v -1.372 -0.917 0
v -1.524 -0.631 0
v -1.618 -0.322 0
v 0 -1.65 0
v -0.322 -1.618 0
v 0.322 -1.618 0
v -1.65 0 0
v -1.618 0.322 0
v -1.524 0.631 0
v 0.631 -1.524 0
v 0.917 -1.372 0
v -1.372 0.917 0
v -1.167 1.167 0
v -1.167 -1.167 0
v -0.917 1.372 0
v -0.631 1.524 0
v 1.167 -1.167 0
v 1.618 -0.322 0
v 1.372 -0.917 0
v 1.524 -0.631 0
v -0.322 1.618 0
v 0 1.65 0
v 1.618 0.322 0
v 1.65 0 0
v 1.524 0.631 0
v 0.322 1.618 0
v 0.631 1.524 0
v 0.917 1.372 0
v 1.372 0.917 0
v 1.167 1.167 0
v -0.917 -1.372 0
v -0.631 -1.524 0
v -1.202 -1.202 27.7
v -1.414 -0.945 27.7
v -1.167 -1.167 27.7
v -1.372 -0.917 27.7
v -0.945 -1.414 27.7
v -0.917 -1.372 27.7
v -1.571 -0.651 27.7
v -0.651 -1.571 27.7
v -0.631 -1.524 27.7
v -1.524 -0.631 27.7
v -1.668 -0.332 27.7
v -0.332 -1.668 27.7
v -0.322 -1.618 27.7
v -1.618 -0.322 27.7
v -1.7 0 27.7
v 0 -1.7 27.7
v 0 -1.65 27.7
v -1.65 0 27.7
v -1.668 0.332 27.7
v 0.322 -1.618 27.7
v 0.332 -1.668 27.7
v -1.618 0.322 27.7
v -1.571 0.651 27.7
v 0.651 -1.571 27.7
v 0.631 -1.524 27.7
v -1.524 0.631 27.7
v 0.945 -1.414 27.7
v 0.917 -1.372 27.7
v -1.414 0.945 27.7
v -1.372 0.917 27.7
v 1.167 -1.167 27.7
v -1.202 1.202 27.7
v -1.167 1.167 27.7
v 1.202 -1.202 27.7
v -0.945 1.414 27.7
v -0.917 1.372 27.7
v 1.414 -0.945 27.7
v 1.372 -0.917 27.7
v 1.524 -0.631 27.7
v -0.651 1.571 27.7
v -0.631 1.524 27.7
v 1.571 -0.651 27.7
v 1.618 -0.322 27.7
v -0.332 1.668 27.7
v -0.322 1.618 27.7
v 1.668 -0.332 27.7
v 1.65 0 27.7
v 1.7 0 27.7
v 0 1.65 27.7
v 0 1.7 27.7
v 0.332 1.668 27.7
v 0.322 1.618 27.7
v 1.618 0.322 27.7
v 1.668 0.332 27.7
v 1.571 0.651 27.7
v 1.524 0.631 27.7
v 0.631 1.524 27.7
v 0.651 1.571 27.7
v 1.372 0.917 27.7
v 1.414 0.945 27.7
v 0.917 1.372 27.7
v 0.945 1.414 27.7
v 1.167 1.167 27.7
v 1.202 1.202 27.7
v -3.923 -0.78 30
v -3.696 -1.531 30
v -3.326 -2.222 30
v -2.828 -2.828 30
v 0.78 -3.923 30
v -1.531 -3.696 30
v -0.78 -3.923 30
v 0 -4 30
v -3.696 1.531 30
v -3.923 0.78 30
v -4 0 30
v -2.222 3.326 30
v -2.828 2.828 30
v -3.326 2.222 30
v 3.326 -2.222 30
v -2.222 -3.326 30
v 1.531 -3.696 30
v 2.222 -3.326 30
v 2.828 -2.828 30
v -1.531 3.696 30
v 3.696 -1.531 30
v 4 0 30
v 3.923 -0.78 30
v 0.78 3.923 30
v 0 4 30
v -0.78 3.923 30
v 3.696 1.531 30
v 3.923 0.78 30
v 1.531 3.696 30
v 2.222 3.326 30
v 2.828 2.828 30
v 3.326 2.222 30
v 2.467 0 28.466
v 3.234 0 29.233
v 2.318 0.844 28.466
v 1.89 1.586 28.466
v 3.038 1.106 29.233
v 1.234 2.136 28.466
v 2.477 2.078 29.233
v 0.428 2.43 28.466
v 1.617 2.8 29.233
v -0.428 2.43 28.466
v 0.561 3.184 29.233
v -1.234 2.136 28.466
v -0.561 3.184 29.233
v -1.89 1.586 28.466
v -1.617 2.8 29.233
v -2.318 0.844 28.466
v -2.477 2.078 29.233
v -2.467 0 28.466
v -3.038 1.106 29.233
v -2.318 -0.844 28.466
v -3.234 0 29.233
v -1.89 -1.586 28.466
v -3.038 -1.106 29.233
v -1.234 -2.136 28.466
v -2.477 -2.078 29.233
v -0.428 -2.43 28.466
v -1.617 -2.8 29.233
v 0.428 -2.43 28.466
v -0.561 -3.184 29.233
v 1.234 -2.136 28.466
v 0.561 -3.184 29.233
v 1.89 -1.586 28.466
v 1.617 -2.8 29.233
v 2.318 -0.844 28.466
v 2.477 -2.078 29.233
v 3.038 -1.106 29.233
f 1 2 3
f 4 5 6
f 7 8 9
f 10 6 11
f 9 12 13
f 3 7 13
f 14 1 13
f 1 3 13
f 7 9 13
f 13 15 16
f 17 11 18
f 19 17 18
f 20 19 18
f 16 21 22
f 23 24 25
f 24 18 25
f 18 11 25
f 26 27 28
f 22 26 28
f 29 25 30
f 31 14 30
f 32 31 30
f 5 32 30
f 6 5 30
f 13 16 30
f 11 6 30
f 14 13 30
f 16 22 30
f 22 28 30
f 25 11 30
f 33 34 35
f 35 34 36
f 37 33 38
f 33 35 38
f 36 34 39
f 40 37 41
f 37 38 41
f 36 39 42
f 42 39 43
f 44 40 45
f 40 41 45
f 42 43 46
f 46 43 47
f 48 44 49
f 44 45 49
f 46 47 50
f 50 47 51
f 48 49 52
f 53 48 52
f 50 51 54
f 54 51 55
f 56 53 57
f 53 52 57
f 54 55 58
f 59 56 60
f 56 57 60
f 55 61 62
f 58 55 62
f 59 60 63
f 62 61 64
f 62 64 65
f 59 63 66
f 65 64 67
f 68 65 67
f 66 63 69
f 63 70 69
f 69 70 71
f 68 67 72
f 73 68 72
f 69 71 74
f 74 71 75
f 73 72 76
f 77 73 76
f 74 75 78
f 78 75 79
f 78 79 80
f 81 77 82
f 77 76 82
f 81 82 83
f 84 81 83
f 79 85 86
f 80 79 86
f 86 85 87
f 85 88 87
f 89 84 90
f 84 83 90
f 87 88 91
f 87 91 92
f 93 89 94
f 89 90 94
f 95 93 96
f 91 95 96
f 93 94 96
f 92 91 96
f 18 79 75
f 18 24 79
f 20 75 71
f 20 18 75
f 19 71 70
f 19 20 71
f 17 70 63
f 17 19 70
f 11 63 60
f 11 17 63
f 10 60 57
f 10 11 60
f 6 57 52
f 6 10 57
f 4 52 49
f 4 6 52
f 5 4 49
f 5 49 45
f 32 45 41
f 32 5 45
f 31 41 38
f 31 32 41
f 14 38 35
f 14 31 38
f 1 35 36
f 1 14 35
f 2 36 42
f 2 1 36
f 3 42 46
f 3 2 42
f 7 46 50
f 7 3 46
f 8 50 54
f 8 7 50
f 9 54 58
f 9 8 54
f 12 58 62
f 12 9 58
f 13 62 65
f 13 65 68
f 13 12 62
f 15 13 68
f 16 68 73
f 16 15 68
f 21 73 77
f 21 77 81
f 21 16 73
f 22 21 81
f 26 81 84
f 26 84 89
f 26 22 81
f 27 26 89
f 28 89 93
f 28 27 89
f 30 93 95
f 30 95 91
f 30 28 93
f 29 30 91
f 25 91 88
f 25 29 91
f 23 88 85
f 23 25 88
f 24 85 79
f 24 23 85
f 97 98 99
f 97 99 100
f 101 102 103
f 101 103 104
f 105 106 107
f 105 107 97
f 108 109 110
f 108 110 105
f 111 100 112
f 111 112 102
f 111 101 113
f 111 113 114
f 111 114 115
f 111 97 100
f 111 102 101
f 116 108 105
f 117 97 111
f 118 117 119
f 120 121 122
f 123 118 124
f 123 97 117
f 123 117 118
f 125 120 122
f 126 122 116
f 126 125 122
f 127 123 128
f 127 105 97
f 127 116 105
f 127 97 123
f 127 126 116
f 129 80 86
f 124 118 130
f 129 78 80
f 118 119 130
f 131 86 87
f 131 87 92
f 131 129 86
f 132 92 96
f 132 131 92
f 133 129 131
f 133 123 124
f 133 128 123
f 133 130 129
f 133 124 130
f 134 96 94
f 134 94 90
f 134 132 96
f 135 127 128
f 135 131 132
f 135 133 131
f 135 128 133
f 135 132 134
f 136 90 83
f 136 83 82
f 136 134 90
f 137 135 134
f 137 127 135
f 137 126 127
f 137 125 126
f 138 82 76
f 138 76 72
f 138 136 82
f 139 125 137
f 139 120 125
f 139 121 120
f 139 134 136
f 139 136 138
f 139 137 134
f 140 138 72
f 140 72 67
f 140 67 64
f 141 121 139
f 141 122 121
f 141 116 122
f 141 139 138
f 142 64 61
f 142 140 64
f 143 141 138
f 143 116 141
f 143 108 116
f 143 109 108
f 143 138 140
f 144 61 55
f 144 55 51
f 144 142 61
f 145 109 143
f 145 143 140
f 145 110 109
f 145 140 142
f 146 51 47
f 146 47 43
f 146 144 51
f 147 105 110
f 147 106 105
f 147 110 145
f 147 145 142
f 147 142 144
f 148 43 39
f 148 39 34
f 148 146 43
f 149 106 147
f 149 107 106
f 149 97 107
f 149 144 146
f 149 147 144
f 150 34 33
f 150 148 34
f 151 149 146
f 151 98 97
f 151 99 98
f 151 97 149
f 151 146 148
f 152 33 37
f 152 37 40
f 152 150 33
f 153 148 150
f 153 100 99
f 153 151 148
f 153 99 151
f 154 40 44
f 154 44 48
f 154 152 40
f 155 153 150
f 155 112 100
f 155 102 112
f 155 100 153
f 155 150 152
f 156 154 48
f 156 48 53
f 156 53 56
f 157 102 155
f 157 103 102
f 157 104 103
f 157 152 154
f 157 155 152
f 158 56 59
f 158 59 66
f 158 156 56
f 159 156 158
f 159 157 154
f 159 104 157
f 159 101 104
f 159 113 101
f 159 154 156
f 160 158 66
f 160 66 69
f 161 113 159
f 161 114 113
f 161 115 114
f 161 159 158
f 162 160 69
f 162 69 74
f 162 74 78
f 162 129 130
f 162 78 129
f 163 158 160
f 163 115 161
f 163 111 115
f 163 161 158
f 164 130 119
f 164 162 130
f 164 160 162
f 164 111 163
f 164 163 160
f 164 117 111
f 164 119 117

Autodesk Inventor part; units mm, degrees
ref_plane "YZ Plane" through (0, 0, 0) normal (1, 0, 0) x (0, 1, 0)
ref_plane "XZ Plane" through (0, 0, 0) normal (0, 1, 0) x (-1, 0, 0)
ref_plane "XY Plane" through (0, 0, 0) normal (0, 0, 1) x (1, 0, 0)
sketch "スケッチ1" plane through (0, 0, 0) normal (0, 0, 1) x (1, 0, 0)
  circle A0 centre (0, 0) radius 1.65
  dimension "d0" = 3.3
extrude "押し出し1" add sketch "スケッチ1" along normal blind 30
sketch "スケッチ2" plane through (0, 0, 30) normal (0, 0, 1) x (1, 0, 0)
  circle A0 centre (0, 0) radius 4
  dimension "d3" = 8
extrude "押し出し2" add sketch "スケッチ2" against normal blind 2.3
chamfer "面取り1" distance 2.3 angle 45 1 edges at (-4, 0, 27.7)
thread "ねじ1" size "M3.5x0.6" class "6g" standard "ANSI Metric M Profile" full length
properties part number "ネジ皿m4,30" material "鋼、高強度、低合金"
